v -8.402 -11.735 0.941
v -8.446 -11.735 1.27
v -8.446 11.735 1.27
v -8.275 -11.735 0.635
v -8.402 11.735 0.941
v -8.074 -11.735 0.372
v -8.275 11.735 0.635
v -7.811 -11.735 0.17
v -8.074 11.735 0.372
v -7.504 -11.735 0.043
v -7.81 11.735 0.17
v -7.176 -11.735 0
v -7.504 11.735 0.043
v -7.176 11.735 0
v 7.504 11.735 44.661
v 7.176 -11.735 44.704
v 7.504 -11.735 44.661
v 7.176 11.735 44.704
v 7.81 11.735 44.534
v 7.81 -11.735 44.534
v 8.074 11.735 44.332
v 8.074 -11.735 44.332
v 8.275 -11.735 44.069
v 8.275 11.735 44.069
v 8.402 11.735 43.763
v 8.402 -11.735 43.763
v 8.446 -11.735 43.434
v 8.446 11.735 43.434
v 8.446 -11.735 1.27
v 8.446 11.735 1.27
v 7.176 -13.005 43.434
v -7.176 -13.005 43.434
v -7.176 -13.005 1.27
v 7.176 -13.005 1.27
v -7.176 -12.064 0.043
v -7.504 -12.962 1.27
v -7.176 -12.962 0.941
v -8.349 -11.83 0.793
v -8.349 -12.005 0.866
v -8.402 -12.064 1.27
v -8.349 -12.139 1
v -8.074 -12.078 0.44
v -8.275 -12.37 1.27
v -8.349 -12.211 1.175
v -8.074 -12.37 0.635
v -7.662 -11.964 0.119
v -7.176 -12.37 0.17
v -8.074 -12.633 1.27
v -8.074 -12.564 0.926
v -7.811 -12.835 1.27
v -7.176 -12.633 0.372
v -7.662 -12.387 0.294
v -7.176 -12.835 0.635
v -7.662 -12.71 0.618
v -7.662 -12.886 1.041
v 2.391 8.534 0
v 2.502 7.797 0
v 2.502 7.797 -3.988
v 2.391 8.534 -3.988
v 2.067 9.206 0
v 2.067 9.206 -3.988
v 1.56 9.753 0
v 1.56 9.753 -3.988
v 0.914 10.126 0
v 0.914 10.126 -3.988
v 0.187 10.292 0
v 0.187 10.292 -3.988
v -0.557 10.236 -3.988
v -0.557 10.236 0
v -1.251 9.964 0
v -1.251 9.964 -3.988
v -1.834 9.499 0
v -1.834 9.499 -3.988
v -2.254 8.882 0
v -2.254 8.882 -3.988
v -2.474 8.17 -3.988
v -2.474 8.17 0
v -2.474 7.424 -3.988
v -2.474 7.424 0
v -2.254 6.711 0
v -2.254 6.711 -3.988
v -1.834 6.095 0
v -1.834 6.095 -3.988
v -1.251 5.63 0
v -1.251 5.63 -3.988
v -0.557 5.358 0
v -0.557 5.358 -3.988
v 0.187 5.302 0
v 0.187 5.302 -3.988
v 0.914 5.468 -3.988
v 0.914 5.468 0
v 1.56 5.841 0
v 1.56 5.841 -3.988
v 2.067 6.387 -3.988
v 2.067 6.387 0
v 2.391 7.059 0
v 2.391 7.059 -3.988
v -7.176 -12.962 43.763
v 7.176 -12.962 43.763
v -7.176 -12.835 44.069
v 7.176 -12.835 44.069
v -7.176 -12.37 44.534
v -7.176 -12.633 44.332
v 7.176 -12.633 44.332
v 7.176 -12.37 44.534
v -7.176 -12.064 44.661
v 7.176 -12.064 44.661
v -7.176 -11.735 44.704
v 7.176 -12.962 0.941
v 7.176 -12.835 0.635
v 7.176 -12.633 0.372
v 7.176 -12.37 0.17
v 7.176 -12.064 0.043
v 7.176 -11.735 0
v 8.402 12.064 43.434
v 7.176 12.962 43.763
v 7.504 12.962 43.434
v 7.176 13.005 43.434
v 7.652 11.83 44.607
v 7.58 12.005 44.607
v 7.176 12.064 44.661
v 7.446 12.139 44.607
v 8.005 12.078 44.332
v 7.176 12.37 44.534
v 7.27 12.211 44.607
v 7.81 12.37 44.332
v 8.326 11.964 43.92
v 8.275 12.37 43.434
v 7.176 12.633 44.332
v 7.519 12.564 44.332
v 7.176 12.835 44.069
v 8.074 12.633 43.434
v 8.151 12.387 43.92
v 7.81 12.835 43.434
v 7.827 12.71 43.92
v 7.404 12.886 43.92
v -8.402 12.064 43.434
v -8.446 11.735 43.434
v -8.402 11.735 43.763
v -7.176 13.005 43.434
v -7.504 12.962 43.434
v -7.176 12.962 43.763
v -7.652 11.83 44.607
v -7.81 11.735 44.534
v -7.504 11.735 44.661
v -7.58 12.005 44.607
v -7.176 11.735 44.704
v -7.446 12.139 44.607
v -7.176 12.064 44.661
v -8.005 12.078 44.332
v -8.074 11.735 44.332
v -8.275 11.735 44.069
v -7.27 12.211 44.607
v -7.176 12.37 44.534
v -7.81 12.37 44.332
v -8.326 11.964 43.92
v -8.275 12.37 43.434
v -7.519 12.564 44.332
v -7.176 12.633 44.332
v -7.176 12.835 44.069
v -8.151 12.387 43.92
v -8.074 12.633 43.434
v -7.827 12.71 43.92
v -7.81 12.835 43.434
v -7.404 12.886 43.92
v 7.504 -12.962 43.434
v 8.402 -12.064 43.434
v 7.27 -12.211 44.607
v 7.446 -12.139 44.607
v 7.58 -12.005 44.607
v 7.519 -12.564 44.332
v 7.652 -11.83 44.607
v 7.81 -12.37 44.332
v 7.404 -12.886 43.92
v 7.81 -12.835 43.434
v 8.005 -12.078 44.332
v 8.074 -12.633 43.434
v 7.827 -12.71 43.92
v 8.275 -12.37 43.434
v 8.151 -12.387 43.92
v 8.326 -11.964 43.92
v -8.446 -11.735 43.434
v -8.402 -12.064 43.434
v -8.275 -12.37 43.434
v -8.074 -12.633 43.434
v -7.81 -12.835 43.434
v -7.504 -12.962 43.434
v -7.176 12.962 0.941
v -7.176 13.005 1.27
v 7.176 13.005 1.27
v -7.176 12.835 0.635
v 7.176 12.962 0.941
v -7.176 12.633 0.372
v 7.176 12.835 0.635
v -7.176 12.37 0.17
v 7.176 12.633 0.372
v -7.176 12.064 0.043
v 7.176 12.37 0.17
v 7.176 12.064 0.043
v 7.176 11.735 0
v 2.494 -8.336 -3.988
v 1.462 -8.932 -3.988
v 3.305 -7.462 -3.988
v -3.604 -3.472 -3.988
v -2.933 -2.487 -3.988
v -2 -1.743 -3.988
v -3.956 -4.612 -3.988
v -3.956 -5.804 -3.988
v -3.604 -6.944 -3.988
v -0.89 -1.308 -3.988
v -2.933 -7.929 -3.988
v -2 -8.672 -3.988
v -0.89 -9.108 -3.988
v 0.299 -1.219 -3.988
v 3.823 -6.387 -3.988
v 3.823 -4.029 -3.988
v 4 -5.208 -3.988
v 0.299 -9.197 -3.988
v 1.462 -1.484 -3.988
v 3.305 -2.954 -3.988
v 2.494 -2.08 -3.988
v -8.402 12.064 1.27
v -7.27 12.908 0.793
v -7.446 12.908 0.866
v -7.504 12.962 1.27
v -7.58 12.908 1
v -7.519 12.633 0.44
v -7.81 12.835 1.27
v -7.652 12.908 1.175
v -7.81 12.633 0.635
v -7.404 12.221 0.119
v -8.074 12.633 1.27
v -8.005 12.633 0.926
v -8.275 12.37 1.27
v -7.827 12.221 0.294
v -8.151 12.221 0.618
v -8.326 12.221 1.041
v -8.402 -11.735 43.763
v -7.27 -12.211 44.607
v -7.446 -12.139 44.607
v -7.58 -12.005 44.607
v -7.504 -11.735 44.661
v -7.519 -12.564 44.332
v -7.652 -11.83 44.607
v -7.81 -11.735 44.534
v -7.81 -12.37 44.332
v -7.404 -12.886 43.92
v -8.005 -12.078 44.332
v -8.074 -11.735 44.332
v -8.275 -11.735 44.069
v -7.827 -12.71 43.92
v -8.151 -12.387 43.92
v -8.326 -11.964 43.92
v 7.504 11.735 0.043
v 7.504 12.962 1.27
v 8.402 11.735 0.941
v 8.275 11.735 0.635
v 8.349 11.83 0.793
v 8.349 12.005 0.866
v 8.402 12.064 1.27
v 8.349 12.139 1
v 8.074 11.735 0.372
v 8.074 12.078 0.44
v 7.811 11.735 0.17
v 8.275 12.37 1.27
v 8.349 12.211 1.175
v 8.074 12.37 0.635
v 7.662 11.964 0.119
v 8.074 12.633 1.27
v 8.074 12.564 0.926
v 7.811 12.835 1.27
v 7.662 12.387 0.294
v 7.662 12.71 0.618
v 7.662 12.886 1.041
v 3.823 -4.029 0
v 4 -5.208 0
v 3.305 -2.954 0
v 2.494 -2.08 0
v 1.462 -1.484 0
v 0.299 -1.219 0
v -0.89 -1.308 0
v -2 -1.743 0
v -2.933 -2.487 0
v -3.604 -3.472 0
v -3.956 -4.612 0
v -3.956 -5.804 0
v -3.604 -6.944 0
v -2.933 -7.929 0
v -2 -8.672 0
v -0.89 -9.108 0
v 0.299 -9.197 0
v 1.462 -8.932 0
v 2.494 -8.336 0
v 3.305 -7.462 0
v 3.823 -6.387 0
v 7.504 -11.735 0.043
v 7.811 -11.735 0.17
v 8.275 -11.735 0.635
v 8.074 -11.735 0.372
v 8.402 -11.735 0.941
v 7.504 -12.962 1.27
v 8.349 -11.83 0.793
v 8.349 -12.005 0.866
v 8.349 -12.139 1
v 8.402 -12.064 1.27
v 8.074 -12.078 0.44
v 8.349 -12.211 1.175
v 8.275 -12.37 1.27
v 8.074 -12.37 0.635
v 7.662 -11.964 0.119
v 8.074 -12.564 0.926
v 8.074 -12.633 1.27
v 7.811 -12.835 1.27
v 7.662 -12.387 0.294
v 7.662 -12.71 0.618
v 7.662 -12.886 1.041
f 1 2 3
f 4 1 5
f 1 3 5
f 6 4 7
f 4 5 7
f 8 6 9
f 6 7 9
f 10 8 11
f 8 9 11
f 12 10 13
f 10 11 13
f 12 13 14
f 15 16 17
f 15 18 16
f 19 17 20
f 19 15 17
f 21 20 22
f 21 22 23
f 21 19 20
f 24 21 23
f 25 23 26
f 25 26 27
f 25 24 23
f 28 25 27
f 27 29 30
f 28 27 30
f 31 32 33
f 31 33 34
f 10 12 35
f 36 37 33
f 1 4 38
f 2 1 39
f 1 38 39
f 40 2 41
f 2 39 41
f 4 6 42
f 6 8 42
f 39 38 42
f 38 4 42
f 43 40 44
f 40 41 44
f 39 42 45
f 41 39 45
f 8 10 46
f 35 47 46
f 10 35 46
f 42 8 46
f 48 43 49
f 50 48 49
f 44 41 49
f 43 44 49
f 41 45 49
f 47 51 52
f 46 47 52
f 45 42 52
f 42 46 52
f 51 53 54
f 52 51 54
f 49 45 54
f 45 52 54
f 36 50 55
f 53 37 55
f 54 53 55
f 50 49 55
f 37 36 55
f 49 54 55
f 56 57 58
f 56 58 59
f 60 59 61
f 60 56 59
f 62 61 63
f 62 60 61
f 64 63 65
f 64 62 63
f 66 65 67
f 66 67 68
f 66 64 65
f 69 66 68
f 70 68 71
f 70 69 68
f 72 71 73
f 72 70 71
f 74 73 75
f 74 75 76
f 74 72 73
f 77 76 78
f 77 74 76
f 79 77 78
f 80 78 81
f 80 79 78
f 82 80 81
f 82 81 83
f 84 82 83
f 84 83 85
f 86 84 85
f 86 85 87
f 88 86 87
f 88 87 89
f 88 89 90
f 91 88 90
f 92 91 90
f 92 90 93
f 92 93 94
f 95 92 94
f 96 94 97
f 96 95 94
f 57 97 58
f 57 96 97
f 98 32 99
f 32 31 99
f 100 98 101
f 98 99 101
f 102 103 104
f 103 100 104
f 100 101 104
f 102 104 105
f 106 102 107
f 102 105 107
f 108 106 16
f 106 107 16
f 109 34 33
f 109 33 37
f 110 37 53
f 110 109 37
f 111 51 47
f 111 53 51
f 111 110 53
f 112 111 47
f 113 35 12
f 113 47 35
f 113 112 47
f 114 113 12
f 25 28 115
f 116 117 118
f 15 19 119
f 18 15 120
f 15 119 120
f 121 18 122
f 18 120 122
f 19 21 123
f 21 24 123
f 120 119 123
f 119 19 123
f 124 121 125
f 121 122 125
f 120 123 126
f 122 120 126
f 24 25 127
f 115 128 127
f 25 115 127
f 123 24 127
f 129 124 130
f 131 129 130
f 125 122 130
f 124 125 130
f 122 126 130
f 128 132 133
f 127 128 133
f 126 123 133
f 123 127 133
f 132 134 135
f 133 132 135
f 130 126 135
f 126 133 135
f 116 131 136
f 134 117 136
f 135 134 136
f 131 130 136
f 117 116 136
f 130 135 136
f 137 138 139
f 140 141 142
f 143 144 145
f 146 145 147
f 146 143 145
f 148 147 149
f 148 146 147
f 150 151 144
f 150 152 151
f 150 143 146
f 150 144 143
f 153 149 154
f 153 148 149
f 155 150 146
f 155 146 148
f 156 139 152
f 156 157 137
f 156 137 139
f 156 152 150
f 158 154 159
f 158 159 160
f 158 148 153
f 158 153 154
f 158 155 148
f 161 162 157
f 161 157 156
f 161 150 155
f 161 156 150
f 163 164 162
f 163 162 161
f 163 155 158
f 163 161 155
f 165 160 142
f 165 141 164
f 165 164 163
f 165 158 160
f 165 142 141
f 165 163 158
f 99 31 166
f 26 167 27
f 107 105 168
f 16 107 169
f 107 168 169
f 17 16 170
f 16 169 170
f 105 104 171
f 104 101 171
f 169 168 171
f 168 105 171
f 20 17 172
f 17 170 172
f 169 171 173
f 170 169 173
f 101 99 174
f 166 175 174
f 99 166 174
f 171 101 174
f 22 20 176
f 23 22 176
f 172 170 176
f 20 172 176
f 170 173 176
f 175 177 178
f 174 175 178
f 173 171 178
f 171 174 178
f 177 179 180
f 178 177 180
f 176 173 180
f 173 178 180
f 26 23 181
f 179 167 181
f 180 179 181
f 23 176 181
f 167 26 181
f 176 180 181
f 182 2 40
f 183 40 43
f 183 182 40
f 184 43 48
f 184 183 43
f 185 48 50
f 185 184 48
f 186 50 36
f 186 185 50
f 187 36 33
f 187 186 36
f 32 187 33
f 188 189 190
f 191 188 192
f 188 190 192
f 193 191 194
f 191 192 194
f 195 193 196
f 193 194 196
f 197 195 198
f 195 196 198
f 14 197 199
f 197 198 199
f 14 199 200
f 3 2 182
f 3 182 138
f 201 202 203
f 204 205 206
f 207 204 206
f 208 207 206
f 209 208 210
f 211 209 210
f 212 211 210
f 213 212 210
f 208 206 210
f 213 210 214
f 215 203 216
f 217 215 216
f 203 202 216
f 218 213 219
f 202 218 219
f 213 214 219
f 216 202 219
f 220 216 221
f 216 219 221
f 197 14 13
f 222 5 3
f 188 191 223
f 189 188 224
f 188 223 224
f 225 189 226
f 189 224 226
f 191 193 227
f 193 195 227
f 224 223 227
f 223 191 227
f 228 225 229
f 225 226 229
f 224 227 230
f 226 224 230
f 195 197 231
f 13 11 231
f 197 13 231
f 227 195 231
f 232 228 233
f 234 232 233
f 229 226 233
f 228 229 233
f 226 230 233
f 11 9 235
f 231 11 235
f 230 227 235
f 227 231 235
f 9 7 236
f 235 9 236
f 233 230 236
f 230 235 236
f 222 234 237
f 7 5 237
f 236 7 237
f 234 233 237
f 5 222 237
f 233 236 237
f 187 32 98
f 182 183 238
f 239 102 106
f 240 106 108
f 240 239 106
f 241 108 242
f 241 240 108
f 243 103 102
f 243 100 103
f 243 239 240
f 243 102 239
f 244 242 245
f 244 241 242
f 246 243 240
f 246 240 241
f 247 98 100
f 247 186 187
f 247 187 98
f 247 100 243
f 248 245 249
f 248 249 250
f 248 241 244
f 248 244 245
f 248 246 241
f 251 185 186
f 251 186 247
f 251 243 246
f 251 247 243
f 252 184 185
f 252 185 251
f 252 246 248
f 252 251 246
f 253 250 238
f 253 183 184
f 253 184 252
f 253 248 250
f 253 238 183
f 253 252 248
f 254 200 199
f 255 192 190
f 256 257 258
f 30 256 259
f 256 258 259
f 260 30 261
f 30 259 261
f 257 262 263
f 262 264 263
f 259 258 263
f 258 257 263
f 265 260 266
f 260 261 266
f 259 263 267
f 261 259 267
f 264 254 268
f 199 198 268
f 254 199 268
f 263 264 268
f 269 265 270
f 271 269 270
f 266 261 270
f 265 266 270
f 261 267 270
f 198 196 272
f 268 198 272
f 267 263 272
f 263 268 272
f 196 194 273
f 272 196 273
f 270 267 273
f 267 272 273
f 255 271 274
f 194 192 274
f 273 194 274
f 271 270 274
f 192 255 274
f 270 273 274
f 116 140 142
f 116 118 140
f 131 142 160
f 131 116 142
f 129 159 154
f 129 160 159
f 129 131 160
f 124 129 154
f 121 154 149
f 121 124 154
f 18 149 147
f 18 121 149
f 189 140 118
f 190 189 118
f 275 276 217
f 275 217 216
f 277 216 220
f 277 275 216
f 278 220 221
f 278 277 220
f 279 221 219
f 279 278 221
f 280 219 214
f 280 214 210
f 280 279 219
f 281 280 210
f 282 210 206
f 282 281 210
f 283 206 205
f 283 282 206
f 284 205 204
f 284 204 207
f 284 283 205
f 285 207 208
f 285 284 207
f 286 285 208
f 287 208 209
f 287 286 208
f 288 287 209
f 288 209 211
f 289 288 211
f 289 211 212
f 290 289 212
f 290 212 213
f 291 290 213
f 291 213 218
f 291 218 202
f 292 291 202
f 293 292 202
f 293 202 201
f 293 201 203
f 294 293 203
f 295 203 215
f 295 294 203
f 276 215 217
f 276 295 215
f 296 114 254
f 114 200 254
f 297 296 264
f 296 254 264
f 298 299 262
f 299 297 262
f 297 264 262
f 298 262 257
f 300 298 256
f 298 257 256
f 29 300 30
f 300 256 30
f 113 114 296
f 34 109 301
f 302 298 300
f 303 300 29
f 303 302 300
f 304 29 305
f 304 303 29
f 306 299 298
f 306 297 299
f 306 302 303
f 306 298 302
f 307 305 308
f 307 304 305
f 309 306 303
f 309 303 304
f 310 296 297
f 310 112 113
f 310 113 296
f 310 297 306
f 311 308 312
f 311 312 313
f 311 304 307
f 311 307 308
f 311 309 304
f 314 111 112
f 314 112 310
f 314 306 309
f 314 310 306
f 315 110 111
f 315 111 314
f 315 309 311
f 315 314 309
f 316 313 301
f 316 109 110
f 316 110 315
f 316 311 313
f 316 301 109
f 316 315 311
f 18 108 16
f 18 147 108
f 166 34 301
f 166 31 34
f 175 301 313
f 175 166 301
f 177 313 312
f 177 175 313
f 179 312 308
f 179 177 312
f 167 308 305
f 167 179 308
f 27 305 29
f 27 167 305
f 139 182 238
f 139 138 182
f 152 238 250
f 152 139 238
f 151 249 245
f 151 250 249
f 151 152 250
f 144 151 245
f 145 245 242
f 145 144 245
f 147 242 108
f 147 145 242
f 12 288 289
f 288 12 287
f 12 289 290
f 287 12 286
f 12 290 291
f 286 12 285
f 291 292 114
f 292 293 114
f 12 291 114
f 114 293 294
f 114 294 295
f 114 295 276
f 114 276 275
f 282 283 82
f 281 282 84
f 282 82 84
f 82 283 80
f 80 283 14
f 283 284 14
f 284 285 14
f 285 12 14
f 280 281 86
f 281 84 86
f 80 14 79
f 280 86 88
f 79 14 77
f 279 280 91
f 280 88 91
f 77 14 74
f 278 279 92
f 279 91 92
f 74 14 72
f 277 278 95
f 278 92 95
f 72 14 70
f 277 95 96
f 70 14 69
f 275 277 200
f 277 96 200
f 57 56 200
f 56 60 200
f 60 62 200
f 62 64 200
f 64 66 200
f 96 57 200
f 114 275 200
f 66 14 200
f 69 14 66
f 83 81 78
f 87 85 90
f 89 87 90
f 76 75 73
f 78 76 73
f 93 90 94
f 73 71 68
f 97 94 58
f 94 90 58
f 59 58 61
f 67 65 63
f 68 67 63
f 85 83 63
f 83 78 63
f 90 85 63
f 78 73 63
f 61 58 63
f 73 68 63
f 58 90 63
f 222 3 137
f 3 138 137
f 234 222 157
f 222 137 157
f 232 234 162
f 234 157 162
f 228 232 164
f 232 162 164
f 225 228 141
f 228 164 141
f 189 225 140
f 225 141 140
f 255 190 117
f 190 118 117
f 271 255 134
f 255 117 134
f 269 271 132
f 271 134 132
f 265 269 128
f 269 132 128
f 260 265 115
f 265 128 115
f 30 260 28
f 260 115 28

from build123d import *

# Parameters (mm, degrees)
F0_W     = 16.891
F0_H     = 26.0096
F1_DEPTH = 44.704
F2_R     = 2.5019
F2_R_2   = 4.0005
F3_DEPTH = 3.9878
F4_R     = 1.27


with BuildPart() as f1:
    # F0 (on Top) → F1 (new body)
    with BuildSketch(Plane.XY):
        Rectangle(F0_W, F0_H)
    extrude(amount=F1_DEPTH)

    # F2 (on Top) → F3 (join)
    with BuildSketch(Plane.XY):
        with Locations((0, 7.796854)):
            Circle(F2_R)
        with Locations((0, -5.207946)):
            Circle(F2_R_2)
    extrude(amount=-F3_DEPTH)

    # F4
    f4_edges = [f1.edges().sort_by_distance(p)[0] for p in [
        (0, -13.0048, 0),
        (-8.4455, 0, 0),
        (0, 13.0048, 0),
        (8.4455, 0, 0),
        (-8.4455, -13.0048, 22.352),
        (-8.4455, 13.0048, 22.352),
        (8.4455, -13.0048, 22.352),
        (0, -13.0048, 44.704),
        (-8.4455, 0, 44.704),
        (8.4455, 13.0048, 22.352),
        (8.4455, 0, 44.704),
        (0, 13.0048, 44.704),
    ]]
    fillet(f4_edges, radius=F4_R)


solid = f1.part
